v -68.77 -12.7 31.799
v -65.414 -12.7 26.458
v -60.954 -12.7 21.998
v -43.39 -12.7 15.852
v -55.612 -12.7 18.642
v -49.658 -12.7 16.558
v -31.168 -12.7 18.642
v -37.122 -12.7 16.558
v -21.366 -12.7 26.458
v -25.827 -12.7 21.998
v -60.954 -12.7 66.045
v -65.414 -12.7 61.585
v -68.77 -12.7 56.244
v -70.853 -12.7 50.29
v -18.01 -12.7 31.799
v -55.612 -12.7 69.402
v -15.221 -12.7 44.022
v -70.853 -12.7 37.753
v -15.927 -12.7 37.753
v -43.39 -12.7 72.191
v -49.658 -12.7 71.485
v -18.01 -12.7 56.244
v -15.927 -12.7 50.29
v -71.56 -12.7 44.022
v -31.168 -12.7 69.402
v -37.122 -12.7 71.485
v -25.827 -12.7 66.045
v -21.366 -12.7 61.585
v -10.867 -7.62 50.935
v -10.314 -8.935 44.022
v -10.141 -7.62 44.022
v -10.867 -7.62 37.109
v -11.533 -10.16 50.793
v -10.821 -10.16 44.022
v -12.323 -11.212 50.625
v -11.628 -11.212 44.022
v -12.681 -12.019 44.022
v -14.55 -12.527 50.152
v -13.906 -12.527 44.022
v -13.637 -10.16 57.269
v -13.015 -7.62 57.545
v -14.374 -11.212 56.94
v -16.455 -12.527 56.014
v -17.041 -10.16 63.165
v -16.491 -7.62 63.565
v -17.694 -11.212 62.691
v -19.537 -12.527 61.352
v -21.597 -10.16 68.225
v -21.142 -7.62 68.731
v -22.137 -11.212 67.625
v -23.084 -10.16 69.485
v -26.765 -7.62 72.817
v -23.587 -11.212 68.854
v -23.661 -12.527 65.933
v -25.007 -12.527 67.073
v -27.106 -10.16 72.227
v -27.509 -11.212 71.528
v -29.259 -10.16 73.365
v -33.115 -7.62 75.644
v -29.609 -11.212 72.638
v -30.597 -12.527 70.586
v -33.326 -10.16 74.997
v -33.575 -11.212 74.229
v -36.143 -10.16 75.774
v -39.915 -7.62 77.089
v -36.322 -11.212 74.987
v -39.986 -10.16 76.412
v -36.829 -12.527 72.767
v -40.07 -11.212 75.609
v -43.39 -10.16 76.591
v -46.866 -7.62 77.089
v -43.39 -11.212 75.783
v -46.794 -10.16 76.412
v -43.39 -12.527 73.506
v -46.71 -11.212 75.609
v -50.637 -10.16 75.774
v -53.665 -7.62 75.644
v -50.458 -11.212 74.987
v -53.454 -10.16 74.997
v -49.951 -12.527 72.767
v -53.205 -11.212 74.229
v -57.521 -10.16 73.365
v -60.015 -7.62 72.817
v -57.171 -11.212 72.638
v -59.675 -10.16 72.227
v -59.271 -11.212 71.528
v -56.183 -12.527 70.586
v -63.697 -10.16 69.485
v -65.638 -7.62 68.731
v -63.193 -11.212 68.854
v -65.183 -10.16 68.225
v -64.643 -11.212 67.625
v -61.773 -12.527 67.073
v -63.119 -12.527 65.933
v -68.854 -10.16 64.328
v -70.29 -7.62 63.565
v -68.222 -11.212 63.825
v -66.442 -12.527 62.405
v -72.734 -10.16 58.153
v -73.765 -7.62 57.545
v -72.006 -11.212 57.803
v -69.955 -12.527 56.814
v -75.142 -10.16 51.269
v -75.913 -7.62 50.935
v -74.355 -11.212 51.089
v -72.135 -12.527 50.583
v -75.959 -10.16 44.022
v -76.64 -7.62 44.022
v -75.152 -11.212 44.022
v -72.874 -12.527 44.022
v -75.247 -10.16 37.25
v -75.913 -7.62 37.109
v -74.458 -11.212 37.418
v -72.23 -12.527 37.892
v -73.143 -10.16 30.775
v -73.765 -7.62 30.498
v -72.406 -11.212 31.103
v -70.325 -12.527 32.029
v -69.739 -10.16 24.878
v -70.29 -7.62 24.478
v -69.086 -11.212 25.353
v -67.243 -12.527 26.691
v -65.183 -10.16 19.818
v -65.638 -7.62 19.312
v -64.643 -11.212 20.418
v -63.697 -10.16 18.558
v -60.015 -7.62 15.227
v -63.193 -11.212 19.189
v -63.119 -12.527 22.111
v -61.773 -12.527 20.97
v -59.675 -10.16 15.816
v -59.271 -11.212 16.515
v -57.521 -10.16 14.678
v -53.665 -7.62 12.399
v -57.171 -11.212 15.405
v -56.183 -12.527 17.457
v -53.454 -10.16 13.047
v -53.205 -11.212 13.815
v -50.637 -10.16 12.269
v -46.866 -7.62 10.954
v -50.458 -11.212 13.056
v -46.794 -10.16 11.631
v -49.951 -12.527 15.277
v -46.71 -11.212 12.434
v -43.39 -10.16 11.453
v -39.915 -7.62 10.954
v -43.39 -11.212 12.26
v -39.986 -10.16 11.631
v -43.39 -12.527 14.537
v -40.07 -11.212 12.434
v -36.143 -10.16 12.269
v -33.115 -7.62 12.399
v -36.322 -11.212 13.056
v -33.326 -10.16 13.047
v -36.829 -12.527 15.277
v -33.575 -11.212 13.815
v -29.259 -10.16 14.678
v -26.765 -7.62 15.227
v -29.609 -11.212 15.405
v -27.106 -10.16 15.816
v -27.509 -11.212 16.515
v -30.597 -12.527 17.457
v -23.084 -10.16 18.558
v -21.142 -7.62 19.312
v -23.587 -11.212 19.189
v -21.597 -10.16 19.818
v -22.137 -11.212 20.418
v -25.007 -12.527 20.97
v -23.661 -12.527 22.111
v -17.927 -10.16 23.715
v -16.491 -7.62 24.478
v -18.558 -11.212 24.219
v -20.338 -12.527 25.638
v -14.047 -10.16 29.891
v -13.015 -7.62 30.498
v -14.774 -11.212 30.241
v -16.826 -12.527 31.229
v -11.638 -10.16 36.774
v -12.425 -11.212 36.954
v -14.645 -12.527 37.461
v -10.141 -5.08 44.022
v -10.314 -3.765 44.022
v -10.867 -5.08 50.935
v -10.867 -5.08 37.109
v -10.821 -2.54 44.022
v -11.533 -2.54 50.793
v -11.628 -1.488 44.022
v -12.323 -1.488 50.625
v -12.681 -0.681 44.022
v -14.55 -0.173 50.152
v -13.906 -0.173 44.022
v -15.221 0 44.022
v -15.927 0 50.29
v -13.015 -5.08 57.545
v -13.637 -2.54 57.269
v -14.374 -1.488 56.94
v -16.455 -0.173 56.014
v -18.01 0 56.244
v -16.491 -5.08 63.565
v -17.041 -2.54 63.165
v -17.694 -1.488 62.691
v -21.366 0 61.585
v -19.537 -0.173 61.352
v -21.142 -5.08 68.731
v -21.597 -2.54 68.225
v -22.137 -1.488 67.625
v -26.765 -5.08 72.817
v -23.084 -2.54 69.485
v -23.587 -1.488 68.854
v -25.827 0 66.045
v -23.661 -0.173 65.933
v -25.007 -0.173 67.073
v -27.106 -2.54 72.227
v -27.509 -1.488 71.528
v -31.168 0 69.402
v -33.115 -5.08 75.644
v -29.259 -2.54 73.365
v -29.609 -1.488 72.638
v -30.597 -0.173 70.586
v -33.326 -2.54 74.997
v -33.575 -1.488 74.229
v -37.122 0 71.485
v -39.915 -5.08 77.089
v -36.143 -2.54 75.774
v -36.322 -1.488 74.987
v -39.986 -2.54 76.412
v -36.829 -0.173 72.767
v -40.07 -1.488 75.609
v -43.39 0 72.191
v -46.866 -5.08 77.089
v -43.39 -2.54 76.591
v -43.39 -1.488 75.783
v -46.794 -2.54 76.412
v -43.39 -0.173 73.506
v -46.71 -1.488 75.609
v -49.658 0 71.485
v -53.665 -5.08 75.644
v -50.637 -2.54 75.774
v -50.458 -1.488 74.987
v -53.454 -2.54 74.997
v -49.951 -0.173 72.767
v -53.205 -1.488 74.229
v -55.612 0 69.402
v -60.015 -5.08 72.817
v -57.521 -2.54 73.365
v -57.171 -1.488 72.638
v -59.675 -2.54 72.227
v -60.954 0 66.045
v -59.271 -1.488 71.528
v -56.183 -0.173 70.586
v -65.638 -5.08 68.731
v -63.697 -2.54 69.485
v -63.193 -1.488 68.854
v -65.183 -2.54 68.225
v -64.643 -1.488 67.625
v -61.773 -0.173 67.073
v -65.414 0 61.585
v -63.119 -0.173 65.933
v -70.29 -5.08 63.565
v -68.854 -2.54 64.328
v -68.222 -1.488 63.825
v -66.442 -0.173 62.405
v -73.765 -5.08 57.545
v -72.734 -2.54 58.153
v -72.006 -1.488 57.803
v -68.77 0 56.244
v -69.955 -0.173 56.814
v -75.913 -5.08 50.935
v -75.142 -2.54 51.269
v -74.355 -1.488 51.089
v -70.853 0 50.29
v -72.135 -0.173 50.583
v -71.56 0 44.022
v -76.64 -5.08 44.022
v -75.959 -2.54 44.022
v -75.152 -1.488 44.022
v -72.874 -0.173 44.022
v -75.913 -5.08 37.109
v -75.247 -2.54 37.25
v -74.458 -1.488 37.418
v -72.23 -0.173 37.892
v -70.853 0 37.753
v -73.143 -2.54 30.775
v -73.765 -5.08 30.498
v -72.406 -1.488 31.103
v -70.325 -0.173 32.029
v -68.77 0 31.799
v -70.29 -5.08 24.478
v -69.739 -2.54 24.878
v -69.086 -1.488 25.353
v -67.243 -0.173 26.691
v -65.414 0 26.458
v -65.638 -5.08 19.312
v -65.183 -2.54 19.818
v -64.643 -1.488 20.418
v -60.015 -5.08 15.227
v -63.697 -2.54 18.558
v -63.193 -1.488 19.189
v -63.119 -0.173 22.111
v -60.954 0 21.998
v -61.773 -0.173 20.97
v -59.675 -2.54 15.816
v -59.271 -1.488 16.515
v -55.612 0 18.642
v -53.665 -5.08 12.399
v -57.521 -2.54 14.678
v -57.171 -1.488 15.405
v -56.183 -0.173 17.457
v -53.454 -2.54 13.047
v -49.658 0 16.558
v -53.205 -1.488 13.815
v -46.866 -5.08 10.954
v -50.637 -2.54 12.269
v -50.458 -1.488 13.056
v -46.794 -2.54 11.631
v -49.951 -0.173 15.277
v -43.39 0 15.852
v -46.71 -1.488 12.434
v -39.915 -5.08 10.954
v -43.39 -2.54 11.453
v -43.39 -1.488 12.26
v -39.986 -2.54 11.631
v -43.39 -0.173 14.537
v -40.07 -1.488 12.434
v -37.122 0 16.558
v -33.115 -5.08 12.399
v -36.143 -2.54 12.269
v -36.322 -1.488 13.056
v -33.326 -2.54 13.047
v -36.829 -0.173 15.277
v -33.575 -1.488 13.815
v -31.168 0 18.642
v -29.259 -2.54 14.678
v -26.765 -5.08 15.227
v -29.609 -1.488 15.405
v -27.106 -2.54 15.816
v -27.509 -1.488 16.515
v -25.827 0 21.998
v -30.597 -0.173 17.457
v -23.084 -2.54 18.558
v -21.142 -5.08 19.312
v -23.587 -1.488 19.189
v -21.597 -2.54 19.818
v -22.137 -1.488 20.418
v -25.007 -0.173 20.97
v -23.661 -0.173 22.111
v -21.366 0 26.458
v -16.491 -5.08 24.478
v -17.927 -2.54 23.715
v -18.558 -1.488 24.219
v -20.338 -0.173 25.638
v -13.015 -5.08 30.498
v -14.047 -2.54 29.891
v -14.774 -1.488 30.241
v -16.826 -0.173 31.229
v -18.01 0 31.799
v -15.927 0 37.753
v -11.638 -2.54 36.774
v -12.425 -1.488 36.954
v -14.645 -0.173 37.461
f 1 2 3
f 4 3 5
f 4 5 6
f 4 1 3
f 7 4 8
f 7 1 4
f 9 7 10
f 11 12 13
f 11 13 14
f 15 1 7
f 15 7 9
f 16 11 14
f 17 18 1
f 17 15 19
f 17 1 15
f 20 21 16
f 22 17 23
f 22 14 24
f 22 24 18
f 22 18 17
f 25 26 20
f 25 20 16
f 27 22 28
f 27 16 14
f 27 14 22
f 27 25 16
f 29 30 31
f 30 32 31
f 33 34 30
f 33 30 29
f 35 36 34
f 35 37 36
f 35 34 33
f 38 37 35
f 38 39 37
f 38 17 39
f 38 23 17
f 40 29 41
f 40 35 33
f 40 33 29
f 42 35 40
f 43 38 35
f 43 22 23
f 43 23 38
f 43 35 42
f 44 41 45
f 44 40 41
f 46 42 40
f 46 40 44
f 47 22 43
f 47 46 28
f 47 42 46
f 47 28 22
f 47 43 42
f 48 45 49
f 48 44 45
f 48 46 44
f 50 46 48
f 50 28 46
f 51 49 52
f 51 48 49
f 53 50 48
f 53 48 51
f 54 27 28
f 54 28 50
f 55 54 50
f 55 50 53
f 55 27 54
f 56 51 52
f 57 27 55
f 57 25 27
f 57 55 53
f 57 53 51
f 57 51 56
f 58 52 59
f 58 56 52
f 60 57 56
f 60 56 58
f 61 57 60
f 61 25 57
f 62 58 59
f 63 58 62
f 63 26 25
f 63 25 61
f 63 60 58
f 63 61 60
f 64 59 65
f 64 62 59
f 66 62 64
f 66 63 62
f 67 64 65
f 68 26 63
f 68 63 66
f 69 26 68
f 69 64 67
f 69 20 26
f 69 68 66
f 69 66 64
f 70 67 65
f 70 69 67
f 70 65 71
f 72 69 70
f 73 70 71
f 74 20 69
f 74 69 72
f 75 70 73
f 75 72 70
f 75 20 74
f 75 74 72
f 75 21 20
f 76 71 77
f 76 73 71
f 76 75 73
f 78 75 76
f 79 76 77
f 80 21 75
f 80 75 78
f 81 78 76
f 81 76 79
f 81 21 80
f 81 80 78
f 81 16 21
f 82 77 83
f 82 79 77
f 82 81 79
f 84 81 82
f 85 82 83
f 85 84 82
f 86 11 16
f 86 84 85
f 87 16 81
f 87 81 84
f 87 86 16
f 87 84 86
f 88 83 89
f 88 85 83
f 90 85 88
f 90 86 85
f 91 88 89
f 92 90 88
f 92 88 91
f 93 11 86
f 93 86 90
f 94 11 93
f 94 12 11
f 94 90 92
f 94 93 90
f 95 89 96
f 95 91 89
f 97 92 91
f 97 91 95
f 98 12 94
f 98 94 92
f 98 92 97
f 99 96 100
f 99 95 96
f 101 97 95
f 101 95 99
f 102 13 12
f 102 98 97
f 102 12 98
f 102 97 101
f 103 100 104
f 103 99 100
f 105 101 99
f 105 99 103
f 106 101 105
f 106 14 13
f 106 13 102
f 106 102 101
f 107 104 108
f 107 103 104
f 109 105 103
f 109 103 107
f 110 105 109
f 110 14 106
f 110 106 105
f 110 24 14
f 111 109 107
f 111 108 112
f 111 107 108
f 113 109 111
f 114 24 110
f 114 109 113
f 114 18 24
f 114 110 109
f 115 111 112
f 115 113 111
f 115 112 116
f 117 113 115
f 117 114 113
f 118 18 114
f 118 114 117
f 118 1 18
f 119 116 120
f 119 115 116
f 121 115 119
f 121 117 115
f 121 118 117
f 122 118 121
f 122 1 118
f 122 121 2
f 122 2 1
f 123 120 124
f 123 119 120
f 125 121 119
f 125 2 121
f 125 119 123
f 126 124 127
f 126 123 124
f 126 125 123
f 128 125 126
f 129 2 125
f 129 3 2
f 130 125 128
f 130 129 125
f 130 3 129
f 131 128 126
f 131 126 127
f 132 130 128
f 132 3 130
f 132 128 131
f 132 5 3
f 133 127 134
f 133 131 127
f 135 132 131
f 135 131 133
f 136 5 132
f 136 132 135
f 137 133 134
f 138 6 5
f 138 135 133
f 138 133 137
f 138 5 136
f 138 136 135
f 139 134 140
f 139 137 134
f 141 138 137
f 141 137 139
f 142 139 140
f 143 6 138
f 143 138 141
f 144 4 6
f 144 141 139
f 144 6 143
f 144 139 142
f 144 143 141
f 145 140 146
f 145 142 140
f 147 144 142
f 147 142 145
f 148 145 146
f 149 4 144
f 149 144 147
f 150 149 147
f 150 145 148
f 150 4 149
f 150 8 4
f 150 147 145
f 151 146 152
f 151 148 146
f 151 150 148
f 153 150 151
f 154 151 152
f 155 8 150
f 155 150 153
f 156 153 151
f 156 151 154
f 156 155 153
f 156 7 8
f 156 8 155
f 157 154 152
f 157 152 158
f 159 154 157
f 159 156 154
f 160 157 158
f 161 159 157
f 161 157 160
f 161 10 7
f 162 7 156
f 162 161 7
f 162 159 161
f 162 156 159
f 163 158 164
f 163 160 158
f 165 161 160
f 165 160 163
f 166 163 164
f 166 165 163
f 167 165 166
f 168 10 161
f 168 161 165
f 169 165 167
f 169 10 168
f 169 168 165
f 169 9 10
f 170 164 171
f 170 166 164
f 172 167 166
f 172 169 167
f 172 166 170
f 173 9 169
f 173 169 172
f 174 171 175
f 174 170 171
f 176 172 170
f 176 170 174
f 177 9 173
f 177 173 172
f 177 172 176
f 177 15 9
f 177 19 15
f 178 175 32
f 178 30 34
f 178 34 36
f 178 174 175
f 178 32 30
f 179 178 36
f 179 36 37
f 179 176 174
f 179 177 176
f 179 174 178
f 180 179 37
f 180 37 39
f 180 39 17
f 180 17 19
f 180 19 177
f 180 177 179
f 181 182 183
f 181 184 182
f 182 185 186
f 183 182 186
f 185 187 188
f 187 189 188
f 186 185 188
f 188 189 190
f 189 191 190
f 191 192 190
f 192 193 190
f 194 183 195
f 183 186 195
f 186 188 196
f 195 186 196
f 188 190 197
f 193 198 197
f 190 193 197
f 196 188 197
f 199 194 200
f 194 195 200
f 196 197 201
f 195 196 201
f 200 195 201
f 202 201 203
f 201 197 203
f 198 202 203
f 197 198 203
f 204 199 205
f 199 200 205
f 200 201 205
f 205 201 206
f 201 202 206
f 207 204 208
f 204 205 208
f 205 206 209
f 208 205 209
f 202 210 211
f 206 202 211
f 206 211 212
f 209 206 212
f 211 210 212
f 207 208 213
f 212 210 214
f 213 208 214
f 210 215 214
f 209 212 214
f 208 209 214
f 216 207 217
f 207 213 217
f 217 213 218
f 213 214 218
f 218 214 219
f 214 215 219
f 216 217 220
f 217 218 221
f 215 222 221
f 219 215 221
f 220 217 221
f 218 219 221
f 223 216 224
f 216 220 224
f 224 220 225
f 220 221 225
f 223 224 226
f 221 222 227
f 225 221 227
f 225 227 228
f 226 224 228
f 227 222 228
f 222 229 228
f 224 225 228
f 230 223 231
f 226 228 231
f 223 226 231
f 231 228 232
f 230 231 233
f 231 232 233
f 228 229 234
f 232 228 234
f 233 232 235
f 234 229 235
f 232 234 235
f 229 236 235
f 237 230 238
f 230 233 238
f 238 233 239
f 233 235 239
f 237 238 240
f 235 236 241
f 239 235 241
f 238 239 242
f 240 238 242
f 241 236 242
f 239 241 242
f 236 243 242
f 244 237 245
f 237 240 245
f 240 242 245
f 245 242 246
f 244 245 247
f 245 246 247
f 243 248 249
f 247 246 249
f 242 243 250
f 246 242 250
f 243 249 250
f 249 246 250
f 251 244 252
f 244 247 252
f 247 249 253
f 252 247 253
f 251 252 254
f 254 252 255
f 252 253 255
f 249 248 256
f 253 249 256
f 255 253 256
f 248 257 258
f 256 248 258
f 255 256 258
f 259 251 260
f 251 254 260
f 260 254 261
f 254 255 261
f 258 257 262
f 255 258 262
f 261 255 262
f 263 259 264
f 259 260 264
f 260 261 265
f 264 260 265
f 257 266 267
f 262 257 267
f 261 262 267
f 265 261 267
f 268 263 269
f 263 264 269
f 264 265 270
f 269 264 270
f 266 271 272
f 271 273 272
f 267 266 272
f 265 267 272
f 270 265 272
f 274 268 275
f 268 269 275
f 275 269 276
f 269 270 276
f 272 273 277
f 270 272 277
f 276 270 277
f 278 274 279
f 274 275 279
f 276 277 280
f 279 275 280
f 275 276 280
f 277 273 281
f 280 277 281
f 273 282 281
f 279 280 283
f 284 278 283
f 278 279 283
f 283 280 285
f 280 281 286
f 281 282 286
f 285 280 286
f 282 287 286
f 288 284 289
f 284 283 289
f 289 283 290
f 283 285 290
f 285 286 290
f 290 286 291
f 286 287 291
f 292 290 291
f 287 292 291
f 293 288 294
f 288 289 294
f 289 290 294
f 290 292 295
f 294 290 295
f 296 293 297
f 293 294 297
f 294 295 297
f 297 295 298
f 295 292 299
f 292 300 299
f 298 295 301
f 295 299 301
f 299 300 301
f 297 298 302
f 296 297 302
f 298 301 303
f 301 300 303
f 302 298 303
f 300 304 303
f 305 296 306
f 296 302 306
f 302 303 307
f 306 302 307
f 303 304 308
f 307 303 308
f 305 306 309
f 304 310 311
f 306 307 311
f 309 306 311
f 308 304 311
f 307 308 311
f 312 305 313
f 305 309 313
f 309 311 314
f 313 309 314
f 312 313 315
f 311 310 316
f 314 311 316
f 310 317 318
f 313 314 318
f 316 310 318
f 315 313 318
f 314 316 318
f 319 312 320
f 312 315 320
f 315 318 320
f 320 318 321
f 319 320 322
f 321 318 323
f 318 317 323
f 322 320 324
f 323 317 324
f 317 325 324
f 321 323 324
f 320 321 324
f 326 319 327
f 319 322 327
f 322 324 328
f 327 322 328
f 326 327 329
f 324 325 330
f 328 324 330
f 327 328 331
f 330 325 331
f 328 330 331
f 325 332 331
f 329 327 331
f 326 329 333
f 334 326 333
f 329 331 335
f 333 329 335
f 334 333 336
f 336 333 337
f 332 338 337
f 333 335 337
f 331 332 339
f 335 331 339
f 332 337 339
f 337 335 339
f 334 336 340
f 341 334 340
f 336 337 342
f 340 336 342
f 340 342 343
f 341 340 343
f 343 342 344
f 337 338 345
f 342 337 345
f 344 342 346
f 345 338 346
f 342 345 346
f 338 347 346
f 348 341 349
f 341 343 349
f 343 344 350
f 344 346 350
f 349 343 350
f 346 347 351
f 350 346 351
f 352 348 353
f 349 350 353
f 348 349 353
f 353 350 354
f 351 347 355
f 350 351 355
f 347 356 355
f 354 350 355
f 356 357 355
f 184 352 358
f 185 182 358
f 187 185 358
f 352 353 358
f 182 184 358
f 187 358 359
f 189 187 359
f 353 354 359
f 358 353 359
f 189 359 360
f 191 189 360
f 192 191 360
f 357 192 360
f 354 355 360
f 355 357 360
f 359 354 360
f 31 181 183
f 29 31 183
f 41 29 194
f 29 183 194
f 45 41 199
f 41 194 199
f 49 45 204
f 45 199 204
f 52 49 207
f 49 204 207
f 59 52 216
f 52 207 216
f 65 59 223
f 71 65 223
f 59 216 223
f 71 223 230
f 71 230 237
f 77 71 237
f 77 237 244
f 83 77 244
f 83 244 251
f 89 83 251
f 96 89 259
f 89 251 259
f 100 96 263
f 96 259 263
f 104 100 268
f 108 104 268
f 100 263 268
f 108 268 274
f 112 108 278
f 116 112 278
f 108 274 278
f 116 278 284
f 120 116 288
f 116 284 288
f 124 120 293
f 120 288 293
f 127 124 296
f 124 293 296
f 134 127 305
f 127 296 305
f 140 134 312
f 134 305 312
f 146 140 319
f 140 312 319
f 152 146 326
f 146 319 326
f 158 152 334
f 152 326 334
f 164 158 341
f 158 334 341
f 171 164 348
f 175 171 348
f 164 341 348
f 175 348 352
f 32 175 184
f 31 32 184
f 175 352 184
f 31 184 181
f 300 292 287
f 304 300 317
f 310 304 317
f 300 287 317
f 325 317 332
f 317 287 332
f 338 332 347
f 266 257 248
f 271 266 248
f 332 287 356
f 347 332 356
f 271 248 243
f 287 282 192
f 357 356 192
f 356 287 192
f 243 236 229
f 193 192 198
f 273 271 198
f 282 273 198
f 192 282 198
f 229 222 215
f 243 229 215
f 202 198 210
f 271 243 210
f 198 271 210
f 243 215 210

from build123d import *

# Parameters (mm, degrees)
F0_R     = 19.1692141119
F1_DEPTH = 12.7
F2_R     = 5.08
F4_R     = 33.249521813
F5_DEPTH = 12.7
F6_R     = 5.08


with BuildPart() as f1:
    # F0 (on Front) → F1 (new body)
    with BuildSketch(Plane.XZ):
        with Locations((-138.7361735106, 32.7932424843)):
            Circle(F0_R)
    extrude(amount=F1_DEPTH)

    # F2
    f2_edges = [f1.edges().sort_by_distance(p)[0] for p in [
        (-157.905388, -12.7, 32.793242),
        (-157.905388, 0, 32.793242),
    ]]
    fillet(f2_edges, radius=F2_R)


with BuildPart() as f5:
    # F4 (on Front) → F5 (new body)
    with BuildSketch(Plane.XZ):
        with Locations((-43.3901064098, 44.0216623247)):
            Circle(F4_R)
    extrude(amount=F5_DEPTH)

    # F6
    f6_edges = [f5.edges().sort_by_distance(p)[0] for p in [
        (-76.639628, 0, 44.021662),
        (-76.639628, -12.7, 44.021662),
    ]]
    fillet(f6_edges, radius=F6_R)


solid = f5.part
